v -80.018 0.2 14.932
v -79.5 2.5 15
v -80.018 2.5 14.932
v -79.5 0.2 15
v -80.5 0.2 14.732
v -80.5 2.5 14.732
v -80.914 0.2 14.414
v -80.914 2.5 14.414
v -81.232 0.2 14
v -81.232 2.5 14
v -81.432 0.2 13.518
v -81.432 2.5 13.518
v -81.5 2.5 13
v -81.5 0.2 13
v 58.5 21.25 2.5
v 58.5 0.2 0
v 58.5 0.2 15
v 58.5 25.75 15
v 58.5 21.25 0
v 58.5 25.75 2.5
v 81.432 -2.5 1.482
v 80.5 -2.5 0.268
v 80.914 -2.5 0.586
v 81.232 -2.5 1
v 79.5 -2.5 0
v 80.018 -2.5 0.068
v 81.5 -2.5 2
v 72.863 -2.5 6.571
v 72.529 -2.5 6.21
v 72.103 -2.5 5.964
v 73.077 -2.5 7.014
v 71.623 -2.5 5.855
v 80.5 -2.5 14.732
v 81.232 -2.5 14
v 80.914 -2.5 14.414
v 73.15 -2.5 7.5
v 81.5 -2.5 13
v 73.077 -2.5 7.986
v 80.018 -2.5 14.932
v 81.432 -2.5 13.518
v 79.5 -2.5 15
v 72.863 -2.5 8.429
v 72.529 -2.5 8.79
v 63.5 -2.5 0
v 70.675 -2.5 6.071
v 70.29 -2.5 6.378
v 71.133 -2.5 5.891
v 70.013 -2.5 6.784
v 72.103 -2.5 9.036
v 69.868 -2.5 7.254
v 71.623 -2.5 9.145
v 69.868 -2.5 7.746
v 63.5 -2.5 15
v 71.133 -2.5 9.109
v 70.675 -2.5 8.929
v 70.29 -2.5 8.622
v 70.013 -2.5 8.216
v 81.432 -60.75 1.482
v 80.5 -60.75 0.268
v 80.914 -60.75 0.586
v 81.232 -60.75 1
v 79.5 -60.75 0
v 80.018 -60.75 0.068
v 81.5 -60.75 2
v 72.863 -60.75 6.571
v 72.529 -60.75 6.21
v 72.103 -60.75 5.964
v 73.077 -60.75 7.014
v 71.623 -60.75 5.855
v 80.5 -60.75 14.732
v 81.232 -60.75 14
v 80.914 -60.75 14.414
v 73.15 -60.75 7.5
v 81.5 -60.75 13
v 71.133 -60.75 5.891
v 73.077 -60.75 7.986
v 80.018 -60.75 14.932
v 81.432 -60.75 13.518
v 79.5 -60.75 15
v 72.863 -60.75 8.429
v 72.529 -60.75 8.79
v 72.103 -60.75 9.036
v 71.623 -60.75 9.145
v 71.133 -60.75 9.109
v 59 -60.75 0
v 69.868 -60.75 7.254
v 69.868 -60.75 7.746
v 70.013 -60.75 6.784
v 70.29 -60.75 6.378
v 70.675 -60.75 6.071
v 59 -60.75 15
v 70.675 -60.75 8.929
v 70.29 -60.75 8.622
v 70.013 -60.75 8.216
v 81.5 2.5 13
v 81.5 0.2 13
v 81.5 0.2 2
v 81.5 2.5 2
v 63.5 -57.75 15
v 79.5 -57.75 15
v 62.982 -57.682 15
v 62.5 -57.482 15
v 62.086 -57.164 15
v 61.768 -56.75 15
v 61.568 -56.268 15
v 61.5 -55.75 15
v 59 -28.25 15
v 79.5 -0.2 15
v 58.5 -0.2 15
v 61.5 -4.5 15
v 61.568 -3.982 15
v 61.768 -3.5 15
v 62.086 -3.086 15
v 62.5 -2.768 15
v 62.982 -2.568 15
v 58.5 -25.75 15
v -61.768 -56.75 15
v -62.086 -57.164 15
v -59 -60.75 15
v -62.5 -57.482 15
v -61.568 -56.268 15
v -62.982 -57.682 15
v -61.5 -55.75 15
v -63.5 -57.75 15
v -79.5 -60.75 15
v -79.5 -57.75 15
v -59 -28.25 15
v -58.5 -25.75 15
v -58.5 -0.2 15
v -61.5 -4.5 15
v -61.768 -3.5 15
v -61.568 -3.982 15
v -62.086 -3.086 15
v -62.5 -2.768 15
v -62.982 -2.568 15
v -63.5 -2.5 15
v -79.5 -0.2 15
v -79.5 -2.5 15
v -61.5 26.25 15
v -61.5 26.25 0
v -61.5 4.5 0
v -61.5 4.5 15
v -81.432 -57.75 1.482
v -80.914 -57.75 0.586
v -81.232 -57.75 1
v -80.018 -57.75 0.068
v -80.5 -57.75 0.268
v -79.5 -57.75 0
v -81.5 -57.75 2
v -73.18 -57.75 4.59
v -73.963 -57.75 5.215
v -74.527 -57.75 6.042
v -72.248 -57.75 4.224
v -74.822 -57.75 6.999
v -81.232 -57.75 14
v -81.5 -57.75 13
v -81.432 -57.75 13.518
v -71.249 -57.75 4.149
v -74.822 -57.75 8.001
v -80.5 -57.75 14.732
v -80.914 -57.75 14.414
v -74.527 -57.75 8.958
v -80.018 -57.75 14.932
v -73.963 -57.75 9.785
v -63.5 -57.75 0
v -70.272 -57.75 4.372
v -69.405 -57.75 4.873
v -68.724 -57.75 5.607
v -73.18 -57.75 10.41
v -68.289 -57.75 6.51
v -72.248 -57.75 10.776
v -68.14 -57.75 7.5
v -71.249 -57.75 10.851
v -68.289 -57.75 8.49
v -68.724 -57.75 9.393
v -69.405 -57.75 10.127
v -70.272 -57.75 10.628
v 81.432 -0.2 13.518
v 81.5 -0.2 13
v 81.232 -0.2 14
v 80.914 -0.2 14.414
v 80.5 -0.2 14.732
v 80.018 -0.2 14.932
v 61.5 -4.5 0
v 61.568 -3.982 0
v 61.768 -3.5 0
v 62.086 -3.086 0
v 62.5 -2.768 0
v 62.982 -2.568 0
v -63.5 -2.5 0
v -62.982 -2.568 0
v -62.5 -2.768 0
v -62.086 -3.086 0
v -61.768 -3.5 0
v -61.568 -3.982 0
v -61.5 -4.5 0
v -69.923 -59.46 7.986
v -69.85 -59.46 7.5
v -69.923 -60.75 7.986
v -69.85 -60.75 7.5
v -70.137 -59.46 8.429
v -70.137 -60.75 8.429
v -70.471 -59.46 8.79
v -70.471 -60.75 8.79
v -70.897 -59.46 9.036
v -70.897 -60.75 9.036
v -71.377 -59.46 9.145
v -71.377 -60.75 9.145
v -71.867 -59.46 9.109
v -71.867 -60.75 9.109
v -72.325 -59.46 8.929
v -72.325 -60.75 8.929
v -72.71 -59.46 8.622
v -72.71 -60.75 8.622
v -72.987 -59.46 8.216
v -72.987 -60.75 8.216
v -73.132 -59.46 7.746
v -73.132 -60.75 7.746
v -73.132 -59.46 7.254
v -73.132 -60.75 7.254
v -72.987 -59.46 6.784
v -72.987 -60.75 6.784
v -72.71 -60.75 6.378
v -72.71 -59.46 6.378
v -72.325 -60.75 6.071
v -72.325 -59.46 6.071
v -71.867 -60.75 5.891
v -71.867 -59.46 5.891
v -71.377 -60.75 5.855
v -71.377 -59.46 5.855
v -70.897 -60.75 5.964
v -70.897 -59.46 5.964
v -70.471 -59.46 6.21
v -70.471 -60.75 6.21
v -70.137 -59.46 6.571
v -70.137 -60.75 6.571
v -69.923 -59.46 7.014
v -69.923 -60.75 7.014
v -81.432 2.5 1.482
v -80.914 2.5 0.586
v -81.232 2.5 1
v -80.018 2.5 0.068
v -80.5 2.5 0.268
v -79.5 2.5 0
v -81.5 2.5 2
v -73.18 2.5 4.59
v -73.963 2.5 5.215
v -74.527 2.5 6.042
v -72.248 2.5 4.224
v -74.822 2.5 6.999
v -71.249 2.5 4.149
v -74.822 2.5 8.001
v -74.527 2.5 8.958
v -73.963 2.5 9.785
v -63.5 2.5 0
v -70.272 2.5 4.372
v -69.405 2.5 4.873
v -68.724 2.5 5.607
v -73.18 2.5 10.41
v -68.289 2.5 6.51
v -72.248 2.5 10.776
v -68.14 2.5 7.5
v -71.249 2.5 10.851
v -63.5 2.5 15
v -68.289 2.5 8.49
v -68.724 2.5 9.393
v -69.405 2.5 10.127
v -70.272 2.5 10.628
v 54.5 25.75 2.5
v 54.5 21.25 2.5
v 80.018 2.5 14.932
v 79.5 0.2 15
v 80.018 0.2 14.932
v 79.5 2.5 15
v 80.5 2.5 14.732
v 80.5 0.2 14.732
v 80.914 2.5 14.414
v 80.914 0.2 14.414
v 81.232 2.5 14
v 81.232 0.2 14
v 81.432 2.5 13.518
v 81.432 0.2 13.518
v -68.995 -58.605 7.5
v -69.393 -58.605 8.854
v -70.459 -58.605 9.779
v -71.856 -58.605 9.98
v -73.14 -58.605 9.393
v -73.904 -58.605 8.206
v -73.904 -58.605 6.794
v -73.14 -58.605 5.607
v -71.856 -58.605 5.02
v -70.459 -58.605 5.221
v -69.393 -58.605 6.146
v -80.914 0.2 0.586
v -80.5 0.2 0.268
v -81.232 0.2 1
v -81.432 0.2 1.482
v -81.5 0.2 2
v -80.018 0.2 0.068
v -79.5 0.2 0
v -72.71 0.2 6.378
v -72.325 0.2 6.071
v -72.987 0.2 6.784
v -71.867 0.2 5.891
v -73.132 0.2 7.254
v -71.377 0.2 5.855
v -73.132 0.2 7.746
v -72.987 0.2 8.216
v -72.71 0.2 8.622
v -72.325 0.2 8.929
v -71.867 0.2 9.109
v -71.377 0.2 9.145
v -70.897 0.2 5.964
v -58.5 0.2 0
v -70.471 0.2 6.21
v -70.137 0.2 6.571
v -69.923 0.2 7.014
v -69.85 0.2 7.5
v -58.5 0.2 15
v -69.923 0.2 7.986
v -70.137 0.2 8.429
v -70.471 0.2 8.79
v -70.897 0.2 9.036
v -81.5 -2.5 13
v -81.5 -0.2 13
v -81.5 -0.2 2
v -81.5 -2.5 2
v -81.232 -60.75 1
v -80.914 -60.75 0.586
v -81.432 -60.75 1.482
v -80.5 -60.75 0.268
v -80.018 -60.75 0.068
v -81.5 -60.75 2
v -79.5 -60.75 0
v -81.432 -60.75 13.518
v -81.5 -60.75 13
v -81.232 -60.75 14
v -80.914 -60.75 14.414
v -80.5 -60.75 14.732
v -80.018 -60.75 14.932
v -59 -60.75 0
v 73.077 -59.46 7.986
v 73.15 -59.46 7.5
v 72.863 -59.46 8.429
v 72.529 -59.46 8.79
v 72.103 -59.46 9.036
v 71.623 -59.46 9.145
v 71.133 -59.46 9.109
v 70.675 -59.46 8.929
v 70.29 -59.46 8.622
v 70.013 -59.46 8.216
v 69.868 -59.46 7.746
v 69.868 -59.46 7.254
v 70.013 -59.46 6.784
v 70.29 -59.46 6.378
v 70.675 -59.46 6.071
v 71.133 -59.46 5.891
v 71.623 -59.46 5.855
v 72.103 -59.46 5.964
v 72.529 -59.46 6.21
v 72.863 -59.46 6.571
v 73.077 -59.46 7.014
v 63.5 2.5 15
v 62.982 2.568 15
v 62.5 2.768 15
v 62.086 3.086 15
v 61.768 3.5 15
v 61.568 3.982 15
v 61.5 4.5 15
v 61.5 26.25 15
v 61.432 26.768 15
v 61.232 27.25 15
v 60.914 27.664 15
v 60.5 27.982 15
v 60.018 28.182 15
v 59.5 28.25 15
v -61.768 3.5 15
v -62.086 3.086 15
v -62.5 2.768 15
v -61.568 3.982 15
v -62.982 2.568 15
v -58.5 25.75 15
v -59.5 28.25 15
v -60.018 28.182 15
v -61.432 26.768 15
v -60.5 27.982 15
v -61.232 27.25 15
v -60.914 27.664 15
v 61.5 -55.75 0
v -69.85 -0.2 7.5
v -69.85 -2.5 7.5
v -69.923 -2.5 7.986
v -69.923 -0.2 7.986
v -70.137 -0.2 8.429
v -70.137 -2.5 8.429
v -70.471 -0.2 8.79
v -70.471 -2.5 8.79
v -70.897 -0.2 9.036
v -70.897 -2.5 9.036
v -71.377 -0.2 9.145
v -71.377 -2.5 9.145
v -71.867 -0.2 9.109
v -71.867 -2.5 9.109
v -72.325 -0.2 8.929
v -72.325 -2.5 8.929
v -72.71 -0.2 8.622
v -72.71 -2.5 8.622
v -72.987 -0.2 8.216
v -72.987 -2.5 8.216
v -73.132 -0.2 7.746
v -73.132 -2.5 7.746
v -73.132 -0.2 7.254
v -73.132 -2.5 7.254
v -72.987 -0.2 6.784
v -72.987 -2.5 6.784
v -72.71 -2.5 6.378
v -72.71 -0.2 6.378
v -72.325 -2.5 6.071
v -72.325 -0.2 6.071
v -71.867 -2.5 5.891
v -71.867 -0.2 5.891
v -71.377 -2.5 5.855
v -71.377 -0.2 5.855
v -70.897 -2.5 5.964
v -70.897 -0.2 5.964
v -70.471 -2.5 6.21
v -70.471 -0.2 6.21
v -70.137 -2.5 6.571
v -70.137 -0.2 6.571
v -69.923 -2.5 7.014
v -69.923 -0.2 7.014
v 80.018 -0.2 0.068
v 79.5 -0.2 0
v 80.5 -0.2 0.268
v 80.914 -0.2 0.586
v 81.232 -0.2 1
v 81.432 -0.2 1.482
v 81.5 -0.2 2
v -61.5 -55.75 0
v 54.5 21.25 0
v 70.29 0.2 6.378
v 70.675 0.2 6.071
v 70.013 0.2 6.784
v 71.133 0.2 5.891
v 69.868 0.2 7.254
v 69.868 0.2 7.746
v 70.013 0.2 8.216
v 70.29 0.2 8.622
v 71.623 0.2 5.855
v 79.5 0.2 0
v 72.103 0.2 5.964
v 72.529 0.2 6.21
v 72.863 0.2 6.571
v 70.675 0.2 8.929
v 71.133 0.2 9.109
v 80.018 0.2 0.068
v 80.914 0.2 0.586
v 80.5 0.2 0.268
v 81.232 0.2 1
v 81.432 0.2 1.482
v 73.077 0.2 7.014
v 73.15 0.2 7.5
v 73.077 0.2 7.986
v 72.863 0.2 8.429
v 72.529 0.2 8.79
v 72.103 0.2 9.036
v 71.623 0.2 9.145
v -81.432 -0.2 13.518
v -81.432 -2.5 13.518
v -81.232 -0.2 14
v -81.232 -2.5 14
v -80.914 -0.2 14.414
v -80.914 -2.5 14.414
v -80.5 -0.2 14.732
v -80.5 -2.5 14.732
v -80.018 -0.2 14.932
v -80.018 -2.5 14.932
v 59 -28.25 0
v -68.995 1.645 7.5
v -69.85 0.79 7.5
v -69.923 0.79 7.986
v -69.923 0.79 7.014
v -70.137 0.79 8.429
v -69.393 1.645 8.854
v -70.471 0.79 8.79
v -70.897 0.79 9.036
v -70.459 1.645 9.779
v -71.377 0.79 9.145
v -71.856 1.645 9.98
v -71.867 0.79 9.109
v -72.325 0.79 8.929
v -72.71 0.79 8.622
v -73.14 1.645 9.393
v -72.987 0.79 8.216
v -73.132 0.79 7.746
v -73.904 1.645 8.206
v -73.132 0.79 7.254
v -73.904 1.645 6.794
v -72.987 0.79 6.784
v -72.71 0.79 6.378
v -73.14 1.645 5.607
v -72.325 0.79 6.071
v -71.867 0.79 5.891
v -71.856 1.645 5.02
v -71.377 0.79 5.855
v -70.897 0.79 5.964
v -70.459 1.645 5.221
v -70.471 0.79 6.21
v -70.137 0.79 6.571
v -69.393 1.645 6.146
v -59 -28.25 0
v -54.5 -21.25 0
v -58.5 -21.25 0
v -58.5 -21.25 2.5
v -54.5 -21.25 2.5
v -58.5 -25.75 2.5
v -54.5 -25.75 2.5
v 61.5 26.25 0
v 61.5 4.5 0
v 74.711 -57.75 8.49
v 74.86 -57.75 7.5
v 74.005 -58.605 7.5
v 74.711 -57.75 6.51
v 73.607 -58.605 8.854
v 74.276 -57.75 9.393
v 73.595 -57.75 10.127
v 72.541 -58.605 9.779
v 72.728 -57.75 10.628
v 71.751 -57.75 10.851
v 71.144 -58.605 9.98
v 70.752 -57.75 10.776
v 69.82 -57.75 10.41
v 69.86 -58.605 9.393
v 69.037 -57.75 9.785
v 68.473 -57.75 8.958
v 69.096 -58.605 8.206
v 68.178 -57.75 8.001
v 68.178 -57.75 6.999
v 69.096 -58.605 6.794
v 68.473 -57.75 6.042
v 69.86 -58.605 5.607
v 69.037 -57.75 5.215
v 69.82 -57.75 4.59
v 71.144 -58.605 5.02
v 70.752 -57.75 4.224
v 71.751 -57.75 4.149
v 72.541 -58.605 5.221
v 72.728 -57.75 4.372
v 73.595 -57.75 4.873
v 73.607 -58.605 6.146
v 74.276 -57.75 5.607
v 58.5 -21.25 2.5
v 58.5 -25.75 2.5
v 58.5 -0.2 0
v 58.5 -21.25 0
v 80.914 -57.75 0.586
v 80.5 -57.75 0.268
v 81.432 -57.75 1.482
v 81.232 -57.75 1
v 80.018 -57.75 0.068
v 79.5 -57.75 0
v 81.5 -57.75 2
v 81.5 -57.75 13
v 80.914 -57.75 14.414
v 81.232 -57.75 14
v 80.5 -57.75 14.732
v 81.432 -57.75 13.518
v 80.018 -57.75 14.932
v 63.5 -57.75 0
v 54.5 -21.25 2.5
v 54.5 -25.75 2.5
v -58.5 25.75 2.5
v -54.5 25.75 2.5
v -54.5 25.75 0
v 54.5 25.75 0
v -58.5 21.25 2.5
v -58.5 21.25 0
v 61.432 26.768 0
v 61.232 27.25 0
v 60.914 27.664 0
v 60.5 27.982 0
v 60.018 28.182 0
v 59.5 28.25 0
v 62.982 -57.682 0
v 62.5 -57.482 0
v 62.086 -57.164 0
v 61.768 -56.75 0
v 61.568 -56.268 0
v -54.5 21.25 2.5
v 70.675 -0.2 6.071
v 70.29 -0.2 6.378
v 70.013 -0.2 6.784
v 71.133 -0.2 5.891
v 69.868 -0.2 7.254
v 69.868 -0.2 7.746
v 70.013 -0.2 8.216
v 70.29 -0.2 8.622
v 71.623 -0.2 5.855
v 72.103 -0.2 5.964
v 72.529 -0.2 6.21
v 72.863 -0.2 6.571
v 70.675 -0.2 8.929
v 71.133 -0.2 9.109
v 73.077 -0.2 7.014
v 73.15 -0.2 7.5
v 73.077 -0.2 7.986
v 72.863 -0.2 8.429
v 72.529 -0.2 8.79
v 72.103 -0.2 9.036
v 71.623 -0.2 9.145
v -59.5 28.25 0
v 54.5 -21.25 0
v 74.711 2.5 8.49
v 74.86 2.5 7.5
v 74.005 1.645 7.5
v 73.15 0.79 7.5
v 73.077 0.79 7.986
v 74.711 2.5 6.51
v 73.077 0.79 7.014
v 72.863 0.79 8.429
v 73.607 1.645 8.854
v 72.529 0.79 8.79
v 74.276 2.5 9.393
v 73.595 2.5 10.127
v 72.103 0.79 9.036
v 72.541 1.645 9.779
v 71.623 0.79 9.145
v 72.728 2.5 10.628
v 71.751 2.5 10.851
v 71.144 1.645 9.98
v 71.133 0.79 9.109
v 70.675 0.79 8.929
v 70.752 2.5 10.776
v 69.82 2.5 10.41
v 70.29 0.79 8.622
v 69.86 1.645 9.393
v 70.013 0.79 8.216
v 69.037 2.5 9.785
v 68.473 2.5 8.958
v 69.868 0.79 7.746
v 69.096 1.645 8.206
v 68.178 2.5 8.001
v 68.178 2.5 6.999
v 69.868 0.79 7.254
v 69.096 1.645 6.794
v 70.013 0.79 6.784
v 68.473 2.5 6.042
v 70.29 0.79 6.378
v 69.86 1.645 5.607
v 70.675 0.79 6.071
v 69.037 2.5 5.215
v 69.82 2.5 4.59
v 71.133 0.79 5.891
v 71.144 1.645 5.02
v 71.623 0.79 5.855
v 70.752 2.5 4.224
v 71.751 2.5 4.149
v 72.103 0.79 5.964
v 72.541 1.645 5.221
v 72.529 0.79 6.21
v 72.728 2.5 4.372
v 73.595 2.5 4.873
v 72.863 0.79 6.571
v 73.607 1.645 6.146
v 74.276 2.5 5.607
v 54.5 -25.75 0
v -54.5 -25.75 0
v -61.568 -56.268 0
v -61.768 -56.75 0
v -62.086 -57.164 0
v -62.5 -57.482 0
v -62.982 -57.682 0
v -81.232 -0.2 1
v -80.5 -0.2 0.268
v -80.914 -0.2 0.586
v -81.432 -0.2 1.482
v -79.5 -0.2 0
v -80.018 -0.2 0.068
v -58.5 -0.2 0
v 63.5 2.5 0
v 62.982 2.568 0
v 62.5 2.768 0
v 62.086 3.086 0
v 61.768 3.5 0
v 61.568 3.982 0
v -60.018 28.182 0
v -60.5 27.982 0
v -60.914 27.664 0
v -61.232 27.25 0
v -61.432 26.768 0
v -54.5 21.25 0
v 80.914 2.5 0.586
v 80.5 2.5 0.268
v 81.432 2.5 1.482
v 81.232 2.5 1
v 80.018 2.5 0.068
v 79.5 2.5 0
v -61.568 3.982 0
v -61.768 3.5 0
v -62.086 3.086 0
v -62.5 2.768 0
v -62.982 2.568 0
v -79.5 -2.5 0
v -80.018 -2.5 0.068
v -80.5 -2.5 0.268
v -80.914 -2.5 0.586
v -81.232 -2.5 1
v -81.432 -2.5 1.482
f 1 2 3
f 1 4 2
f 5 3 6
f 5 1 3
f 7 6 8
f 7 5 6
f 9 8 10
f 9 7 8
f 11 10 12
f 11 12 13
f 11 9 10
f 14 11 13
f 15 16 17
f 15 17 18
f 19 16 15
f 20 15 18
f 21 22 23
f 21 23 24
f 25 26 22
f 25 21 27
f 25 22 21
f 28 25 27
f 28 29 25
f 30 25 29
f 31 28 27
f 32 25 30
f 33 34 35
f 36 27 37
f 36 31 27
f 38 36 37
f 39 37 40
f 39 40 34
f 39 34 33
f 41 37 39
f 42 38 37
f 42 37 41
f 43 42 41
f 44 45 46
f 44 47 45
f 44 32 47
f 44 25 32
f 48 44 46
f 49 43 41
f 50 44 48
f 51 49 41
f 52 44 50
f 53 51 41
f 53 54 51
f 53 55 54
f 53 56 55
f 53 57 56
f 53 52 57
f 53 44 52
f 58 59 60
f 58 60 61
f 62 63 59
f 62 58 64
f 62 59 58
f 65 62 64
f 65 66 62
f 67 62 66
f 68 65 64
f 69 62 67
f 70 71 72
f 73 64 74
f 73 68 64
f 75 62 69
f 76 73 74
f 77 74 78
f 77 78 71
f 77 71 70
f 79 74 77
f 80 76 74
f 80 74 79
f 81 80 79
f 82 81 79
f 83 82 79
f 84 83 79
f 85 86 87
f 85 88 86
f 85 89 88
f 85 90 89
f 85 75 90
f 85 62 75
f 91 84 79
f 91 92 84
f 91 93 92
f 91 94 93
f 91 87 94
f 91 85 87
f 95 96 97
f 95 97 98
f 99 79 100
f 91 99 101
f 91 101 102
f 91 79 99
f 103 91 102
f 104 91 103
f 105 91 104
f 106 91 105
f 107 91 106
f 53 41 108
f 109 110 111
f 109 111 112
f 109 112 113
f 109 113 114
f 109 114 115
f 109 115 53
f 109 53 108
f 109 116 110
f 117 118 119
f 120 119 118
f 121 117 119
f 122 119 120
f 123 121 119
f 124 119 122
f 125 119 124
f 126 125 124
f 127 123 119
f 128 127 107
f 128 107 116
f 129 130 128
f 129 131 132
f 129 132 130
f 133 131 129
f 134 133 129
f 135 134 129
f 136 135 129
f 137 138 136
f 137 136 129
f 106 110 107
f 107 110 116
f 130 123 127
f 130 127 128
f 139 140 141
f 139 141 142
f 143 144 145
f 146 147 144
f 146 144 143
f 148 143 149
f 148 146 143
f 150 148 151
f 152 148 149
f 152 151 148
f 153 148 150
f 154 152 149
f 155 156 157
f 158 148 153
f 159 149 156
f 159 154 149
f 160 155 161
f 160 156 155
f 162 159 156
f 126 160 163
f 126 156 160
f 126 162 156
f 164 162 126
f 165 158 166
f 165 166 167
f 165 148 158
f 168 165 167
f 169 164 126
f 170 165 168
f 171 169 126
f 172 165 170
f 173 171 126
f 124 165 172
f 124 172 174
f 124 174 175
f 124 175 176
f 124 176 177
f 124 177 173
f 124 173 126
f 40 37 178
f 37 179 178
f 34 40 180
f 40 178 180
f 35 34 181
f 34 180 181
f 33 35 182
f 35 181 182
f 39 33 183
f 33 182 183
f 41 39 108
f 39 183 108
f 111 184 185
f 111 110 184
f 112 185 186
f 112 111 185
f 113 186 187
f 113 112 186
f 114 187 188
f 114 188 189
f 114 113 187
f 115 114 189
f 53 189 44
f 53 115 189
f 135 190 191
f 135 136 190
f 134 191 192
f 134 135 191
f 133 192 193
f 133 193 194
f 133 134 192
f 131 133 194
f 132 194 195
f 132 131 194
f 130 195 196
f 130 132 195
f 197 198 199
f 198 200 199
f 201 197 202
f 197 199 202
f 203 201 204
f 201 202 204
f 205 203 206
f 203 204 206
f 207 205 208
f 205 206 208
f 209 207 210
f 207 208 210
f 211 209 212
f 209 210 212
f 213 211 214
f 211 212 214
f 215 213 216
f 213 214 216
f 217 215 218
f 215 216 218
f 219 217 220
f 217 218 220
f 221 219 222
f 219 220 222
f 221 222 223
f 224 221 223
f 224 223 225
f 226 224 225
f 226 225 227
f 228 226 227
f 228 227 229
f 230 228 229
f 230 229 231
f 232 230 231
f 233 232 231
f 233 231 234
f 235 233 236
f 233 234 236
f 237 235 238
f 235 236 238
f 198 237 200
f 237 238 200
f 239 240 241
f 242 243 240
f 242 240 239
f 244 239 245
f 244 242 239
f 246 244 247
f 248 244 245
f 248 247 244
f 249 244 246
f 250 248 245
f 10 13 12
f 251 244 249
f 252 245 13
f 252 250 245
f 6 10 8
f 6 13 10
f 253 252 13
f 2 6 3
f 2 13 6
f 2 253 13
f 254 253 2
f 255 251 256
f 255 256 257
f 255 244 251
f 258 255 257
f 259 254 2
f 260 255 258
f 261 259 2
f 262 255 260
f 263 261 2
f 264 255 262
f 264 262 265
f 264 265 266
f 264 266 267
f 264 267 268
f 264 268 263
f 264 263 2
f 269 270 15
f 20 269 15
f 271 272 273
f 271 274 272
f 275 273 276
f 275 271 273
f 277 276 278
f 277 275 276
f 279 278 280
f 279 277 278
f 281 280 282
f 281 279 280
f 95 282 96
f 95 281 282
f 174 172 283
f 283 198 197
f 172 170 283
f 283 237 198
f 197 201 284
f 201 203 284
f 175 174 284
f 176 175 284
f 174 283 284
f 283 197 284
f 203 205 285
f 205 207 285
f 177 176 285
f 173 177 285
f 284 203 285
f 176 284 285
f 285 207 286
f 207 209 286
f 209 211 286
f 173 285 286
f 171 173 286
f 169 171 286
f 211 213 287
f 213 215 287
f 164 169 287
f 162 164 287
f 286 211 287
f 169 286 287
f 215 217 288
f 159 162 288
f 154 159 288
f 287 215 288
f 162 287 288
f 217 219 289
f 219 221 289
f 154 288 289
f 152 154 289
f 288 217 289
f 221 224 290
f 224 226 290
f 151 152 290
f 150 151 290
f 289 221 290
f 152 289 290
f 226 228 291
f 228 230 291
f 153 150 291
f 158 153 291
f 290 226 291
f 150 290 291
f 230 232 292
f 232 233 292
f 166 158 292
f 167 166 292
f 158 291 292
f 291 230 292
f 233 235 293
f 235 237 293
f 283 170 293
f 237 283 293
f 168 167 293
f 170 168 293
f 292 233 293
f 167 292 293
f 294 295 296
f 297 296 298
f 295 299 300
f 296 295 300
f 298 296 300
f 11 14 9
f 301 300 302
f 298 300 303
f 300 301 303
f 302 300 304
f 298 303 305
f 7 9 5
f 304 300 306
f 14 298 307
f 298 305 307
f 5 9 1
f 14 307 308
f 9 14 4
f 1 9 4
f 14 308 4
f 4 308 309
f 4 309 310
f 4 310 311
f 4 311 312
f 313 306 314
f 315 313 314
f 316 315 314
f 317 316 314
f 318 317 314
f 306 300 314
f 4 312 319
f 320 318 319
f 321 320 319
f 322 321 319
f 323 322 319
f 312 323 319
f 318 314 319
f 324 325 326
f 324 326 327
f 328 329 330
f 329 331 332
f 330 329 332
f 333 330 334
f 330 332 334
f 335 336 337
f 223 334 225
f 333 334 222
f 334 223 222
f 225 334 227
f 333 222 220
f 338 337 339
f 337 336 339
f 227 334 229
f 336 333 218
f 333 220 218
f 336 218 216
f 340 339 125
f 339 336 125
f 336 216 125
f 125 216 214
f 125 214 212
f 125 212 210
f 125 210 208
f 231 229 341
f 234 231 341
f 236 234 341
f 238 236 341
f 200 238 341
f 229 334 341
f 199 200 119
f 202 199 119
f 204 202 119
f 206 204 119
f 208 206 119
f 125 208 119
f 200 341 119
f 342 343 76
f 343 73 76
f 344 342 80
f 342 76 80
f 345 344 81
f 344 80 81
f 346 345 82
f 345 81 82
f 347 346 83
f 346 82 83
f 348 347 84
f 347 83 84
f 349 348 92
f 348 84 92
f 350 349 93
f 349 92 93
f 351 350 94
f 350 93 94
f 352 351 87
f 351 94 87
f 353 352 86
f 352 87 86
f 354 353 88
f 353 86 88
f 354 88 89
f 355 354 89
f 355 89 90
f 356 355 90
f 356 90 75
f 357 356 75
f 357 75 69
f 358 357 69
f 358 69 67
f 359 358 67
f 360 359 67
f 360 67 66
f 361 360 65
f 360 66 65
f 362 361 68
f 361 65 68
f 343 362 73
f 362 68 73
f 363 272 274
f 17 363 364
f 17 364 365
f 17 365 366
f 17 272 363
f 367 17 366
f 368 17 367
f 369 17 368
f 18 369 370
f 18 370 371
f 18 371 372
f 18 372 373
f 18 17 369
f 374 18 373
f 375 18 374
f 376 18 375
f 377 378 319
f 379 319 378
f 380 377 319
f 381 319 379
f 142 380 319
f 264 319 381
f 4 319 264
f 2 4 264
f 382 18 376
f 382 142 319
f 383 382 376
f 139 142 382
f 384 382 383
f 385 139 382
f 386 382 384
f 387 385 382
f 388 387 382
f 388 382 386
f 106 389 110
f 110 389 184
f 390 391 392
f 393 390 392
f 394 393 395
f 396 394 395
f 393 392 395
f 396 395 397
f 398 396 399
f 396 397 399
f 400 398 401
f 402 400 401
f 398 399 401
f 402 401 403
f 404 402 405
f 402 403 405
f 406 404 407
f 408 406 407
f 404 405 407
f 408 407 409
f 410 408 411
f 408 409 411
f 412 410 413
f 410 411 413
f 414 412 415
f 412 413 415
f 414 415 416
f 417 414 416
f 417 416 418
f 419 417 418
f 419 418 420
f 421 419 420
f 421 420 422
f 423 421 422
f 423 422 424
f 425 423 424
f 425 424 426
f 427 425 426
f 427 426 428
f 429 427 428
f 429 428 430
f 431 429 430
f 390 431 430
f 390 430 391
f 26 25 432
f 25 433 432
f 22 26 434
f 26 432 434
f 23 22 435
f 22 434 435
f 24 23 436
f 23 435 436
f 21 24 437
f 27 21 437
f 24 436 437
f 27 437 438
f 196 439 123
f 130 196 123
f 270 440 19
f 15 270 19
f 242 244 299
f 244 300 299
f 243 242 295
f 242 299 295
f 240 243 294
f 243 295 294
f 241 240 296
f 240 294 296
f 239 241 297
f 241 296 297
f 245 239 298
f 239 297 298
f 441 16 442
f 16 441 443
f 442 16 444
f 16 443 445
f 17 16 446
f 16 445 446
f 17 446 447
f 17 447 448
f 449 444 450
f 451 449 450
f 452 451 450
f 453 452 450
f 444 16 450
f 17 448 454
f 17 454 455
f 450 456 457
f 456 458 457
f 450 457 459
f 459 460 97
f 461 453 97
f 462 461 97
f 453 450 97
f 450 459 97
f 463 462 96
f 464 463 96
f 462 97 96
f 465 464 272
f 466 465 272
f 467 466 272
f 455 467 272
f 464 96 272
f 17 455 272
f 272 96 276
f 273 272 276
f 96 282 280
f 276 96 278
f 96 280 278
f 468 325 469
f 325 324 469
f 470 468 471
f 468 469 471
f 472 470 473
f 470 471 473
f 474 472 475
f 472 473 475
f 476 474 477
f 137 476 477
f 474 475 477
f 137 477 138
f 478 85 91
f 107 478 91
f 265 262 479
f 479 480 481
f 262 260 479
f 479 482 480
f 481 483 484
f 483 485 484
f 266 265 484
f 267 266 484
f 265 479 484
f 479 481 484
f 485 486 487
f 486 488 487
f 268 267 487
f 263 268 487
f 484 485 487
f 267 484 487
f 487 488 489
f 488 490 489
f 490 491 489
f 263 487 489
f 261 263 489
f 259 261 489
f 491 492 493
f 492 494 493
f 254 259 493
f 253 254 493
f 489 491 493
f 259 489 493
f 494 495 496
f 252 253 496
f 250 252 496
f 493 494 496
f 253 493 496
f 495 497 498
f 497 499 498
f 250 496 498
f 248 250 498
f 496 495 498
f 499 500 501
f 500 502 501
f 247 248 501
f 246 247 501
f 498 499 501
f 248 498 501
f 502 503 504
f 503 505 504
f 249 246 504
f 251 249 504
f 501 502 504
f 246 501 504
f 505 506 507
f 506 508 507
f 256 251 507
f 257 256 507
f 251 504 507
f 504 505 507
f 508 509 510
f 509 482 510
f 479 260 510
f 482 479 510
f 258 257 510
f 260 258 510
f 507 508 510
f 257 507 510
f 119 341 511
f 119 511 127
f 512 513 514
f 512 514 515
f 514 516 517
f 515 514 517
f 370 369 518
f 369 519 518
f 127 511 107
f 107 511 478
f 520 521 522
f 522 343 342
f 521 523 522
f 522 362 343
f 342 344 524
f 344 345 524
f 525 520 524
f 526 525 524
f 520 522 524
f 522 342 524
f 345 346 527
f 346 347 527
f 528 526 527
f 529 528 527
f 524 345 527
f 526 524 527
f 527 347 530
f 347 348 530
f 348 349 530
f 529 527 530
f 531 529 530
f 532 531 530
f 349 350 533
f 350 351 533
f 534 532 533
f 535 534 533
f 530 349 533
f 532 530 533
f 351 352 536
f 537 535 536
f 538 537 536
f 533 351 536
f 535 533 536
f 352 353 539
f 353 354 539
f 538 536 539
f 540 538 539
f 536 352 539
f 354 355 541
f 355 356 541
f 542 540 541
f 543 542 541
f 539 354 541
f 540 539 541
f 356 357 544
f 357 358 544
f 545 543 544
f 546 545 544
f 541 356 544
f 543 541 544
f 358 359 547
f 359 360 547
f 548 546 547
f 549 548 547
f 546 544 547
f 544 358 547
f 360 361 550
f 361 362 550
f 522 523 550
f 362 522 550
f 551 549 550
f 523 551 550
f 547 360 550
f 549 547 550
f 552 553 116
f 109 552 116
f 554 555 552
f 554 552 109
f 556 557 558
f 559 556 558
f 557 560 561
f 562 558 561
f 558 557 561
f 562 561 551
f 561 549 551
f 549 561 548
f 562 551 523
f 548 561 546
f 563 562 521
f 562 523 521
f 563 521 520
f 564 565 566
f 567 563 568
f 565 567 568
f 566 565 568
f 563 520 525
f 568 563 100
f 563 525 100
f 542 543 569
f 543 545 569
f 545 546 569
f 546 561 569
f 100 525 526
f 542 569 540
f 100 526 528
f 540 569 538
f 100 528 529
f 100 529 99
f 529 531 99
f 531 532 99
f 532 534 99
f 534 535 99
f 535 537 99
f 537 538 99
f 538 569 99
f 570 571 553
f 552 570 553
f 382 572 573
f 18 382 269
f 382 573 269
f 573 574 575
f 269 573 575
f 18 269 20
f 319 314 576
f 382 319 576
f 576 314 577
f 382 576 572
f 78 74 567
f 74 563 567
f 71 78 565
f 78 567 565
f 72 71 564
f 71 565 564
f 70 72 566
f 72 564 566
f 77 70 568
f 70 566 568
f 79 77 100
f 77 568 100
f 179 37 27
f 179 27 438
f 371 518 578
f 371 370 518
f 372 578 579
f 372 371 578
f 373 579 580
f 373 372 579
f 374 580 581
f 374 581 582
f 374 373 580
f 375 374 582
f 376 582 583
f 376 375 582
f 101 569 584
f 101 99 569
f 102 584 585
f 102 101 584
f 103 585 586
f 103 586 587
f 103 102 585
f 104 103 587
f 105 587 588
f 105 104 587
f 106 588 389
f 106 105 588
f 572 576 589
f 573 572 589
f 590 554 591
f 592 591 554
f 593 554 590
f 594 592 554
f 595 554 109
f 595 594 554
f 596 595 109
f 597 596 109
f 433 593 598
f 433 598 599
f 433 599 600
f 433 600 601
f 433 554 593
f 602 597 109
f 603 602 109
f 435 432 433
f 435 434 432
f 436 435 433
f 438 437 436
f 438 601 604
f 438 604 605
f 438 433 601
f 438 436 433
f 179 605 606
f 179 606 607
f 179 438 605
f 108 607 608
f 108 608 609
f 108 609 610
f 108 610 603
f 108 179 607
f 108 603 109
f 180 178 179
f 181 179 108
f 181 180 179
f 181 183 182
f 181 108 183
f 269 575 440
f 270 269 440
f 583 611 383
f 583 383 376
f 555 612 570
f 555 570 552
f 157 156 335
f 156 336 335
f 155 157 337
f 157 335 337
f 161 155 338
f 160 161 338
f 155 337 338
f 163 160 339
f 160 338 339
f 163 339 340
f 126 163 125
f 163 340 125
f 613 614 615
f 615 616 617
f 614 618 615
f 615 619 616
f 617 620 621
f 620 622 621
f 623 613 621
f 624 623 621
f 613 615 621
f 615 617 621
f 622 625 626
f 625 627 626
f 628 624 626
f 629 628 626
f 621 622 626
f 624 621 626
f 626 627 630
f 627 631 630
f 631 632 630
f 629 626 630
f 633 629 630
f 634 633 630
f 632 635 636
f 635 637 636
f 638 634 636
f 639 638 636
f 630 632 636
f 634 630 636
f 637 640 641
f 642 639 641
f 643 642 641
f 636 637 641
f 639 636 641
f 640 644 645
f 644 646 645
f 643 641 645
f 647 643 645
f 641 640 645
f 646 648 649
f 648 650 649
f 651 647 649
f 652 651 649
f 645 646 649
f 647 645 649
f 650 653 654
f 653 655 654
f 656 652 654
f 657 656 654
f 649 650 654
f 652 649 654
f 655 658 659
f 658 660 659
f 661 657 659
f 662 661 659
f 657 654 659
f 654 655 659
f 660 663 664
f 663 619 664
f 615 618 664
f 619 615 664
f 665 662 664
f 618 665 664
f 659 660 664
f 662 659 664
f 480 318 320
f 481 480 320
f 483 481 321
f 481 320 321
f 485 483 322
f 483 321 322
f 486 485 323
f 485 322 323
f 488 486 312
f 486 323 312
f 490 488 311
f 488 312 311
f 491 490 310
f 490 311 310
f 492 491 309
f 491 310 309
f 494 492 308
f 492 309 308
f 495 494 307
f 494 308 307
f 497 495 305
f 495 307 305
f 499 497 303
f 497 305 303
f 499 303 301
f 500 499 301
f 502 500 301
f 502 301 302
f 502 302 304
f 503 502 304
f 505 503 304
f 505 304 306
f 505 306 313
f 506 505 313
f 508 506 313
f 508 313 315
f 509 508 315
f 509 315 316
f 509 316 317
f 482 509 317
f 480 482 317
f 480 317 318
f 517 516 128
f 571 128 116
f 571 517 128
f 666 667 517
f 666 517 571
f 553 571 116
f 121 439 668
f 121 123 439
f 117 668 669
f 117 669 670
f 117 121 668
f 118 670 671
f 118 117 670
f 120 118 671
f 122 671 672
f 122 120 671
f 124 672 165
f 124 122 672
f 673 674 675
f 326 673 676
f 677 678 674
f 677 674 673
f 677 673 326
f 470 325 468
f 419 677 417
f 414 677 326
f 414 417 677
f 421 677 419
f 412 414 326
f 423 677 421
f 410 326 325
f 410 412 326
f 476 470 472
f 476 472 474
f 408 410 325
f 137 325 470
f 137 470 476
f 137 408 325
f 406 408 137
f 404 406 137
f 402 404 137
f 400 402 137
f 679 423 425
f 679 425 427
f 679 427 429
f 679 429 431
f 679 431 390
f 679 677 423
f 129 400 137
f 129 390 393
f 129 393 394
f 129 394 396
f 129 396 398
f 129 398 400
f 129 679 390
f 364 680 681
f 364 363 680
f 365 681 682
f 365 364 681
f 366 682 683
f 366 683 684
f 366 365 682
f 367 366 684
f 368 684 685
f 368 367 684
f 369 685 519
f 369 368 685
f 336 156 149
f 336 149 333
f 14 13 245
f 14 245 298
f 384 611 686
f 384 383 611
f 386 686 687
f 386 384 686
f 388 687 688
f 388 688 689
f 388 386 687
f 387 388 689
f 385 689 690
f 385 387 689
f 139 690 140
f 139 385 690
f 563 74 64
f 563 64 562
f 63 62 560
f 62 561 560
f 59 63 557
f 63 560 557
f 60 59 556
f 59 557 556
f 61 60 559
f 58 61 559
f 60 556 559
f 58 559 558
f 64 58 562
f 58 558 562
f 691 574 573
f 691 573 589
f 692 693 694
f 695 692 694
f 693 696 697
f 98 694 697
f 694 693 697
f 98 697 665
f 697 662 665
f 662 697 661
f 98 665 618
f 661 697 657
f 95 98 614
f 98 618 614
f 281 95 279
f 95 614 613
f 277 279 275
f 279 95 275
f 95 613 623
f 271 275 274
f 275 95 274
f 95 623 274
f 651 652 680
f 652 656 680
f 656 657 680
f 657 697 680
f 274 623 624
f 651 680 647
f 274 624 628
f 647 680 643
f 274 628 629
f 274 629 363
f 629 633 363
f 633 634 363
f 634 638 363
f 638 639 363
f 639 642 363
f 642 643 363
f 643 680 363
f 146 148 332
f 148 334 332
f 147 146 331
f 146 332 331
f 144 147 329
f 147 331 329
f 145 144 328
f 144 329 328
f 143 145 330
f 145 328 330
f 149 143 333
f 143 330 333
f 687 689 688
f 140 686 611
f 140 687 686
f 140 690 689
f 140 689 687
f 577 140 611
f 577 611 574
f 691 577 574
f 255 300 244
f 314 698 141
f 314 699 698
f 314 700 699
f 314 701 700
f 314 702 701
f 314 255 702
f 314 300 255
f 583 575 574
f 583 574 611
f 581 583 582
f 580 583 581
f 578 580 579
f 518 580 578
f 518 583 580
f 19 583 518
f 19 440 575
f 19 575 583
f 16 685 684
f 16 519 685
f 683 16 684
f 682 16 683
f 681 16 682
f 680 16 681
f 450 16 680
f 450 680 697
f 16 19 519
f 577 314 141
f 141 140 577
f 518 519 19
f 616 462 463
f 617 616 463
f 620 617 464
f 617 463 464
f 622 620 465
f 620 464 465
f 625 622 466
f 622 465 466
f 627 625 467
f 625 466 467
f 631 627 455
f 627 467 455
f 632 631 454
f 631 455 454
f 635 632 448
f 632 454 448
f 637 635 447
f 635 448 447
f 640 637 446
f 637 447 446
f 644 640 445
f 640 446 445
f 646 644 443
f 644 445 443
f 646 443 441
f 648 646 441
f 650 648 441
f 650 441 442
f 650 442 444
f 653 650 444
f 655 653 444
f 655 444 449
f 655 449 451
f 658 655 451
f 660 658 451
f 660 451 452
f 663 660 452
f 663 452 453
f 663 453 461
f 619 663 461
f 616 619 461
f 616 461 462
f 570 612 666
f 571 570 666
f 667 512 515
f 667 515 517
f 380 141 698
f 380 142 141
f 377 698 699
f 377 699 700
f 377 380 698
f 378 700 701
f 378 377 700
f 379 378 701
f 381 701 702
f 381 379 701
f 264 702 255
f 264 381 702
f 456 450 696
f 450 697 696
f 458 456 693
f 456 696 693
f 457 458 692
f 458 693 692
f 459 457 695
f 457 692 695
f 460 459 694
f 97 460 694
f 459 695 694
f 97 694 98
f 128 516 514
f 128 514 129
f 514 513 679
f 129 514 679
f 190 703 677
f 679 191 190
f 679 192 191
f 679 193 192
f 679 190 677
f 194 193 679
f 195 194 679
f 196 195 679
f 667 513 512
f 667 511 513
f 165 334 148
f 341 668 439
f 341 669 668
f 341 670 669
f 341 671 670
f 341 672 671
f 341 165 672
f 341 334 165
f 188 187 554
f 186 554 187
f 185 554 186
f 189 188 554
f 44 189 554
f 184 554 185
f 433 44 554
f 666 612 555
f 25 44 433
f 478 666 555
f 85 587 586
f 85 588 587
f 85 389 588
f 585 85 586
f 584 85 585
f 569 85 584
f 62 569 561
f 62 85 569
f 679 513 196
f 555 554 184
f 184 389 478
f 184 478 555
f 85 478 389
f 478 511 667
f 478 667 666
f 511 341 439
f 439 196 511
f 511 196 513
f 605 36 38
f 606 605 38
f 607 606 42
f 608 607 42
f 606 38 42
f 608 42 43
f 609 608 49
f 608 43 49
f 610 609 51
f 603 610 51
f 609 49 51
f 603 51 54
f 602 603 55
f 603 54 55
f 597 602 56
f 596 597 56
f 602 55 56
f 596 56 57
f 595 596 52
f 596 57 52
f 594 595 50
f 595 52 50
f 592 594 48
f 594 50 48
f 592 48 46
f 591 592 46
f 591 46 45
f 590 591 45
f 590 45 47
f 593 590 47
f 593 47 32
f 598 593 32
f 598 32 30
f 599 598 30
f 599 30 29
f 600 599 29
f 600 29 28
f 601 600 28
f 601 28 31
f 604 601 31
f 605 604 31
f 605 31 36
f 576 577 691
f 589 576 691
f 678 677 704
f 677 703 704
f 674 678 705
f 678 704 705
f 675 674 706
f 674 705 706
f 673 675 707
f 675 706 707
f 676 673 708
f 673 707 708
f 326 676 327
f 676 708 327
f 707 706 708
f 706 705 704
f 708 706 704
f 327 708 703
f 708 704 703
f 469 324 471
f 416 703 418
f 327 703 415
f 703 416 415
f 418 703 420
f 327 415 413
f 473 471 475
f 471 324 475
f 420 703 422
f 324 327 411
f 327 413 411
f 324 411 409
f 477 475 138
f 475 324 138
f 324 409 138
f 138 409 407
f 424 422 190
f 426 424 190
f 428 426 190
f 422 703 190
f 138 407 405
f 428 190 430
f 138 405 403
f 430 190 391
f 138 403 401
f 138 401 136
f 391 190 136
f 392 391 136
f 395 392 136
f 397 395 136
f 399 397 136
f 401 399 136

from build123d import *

# Parameters (mm, degrees)
F0_W            = 123
F0_H            = 56.5
F0_W_2          = 117
F0_H_2          = 51.5
F1_DEPTH        = 15
F3_W            = 2.5
F3_H            = 15
F4_DEPTH        = 32.5
F5_W            = 3
F5_H            = 15
F6_DEPTH        = 20
F7_W            = 3
F7_H            = 15
F8_DEPTH        = 20
F10_D           = 3.3
F10_DEPTH       = 5
F10_CSINK_D     = 6.72
F10_CSINK_ANGLE = 90
F10_TIP         = 0.9914200214
F12_D           = 3.3
F12_DEPTH       = 5
F12_CSINK_D     = 6.72
F12_CSINK_ANGLE = 90
F12_TIP         = 0.9914200214
F13_W           = 4
F13_H           = 4.5
F14_DEPTH       = 2.5
F15_W           = 5
F15_H           = 15
F16_DEPTH       = 20
F18_D           = 3.3
F18_CSINK_D     = 6.72
F18_CSINK_ANGLE = 90
F19_W           = 5
F19_H           = 15
F20_DEPTH       = 20
F22_D           = 3.3
F22_CSINK_D     = 6.72
F22_CSINK_ANGLE = 90
F23_W           = 0.4
F23_H           = 15
F24_DEPTH       = 200
F25_R           = 2


with BuildPart() as f1:
    # F0 (on Top) → F1 (new body)
    with BuildSketch(Plane.XY):
        Rectangle(F0_W, F0_H)
        Rectangle(F0_W_2, F0_H_2, mode=Mode.SUBTRACT)
    extrude(amount=F1_DEPTH)

    # F3 (on face) → F4 (join)
    with BuildSketch(Plane.XZ.offset(28.25)):
        with Locations((-60.25, 7.5)):
            Rectangle(F3_W, F3_H)
        with Locations((60.25, 7.5)):
            Rectangle(F3_W, F3_H)
    extrude(amount=F4_DEPTH)

    # F5 (on face) → F6 (join)
    with BuildSketch(Plane(origin=(-61.5, 0, 0), x_dir=(0, -1, 0), z_dir=(-1, 0, 0))):
        with Locations((59.25, 7.5)):
            Rectangle(F5_W, F5_H)
    extrude(amount=F6_DEPTH)

    # F7 (on face) → F8 (join)
    with BuildSketch(Plane.YZ.offset(61.5)):
        with Locations((-59.25, 7.5)):
            Rectangle(F7_W, F7_H)
    extrude(amount=F8_DEPTH)

    # F10
    with Locations(Plane(origin=(0, -57.75, 0), x_dir=(-1, 0, 0), z_dir=(0, 1, 0))):
        with Locations((-71.5, 7.5)):
            CounterSinkHole(F10_D / 2, F10_CSINK_D / 2, depth=F10_DEPTH, counter_sink_angle=F10_CSINK_ANGLE)
            with Locations((0, 0, -(F10_DEPTH + F10_TIP / 2))):  # 118° drill point
                Cone(0, F10_D / 2, F10_TIP, mode=Mode.SUBTRACT)

    # F12
    with Locations(Plane(origin=(0, -57.75, 0), x_dir=(-1, 0, 0), z_dir=(0, 1, 0))):
        with Locations((71.5, 7.5)):
            CounterSinkHole(F12_D / 2, F12_CSINK_D / 2, depth=F12_DEPTH, counter_sink_angle=F12_CSINK_ANGLE)
            with Locations((0, 0, -(F12_DEPTH + F12_TIP / 2))):  # 118° drill point
                Cone(0, F12_D / 2, F12_TIP, mode=Mode.SUBTRACT)

    # F13 (on face) → F14 (join)
    with BuildSketch(Plane(origin=(0, 0, 0), x_dir=(1, 0, 0), z_dir=(0, 0, -1))):
        with Locations((-56.5, -23.5)):
            Rectangle(F13_W, F13_H)
        with Locations((-56.5, 23.5)):
            Rectangle(F13_W, F13_H)
        with Locations((56.5, 23.5)):
            Rectangle(F13_W, F13_H)
        with Locations((56.5, -23.5)):
            Rectangle(F13_W, F13_H)
    extrude(amount=-F14_DEPTH)

    # F15 (on face) → F16 (join)
    with BuildSketch(Plane(origin=(-61.5, 0, 0), x_dir=(0, -1, 0), z_dir=(-1, 0, 0))):
        with Locations((0, 7.5)):
            Rectangle(F15_W, F15_H)
    extrude(amount=F16_DEPTH)

    # F18 (through all)
    with Locations(Plane(origin=(0, 2.5, 0), x_dir=(-1, 0, 0), z_dir=(0, 1, 0))):
        with Locations((71.5, 7.5)):
            CounterSinkHole(F18_D / 2, F18_CSINK_D / 2, counter_sink_angle=F18_CSINK_ANGLE)

    # F19 (on face) → F20 (join)
    with BuildSketch(Plane.YZ.offset(61.5)):
        with Locations((0, 7.5)):
            Rectangle(F19_W, F19_H)
    extrude(amount=F20_DEPTH)

    # F22 (through all)
    with Locations(Plane(origin=(0, 2.5, 0), x_dir=(-1, 0, 0), z_dir=(0, 1, 0))):
        with Locations((-71.5, 7.5)):
            CounterSinkHole(F22_D / 2, F22_CSINK_D / 2, counter_sink_angle=F22_CSINK_ANGLE)

    # F23 (on face) → F24 (cut)
    with BuildSketch(Plane.YZ.offset(81.5)):
        with Locations((0, 7.5)):
            Rectangle(F23_W, F23_H)
    extrude(amount=-F24_DEPTH, mode=Mode.SUBTRACT)

    # F25
    f25_edges = [f1.edges().sort_by_distance(p)[0] for p in [
        (-61.5, 28.25, 7.5),
        (-81.5, -1.35, 0),
        (-81.5, 1.35, 0),
        (-81.5, -59.25, 15),
        (81.5, -59.25, 0),
        (81.5, -1.35, 15),
        (81.5, 1.35, 15),
        (61.5, 28.25, 7.5),
        (-61.5, -57.75, 7.5),
        (61.5, -57.75, 7.5),
        (81.5, -1.35, 0),
        (81.5, 1.35, 0),
        (-81.5, -1.35, 15),
        (-81.5, 1.35, 15),
        (-61.5, 2.5, 7.5),
        (-61.5, -2.5, 7.5),
        (61.5, 2.5, 7.5),
        (61.5, -2.5, 7.5),
        (-81.5, -59.25, 0),
        (81.5, -59.25, 15),
    ]]
    fillet(f25_edges, radius=F25_R)


solid = f1.part
